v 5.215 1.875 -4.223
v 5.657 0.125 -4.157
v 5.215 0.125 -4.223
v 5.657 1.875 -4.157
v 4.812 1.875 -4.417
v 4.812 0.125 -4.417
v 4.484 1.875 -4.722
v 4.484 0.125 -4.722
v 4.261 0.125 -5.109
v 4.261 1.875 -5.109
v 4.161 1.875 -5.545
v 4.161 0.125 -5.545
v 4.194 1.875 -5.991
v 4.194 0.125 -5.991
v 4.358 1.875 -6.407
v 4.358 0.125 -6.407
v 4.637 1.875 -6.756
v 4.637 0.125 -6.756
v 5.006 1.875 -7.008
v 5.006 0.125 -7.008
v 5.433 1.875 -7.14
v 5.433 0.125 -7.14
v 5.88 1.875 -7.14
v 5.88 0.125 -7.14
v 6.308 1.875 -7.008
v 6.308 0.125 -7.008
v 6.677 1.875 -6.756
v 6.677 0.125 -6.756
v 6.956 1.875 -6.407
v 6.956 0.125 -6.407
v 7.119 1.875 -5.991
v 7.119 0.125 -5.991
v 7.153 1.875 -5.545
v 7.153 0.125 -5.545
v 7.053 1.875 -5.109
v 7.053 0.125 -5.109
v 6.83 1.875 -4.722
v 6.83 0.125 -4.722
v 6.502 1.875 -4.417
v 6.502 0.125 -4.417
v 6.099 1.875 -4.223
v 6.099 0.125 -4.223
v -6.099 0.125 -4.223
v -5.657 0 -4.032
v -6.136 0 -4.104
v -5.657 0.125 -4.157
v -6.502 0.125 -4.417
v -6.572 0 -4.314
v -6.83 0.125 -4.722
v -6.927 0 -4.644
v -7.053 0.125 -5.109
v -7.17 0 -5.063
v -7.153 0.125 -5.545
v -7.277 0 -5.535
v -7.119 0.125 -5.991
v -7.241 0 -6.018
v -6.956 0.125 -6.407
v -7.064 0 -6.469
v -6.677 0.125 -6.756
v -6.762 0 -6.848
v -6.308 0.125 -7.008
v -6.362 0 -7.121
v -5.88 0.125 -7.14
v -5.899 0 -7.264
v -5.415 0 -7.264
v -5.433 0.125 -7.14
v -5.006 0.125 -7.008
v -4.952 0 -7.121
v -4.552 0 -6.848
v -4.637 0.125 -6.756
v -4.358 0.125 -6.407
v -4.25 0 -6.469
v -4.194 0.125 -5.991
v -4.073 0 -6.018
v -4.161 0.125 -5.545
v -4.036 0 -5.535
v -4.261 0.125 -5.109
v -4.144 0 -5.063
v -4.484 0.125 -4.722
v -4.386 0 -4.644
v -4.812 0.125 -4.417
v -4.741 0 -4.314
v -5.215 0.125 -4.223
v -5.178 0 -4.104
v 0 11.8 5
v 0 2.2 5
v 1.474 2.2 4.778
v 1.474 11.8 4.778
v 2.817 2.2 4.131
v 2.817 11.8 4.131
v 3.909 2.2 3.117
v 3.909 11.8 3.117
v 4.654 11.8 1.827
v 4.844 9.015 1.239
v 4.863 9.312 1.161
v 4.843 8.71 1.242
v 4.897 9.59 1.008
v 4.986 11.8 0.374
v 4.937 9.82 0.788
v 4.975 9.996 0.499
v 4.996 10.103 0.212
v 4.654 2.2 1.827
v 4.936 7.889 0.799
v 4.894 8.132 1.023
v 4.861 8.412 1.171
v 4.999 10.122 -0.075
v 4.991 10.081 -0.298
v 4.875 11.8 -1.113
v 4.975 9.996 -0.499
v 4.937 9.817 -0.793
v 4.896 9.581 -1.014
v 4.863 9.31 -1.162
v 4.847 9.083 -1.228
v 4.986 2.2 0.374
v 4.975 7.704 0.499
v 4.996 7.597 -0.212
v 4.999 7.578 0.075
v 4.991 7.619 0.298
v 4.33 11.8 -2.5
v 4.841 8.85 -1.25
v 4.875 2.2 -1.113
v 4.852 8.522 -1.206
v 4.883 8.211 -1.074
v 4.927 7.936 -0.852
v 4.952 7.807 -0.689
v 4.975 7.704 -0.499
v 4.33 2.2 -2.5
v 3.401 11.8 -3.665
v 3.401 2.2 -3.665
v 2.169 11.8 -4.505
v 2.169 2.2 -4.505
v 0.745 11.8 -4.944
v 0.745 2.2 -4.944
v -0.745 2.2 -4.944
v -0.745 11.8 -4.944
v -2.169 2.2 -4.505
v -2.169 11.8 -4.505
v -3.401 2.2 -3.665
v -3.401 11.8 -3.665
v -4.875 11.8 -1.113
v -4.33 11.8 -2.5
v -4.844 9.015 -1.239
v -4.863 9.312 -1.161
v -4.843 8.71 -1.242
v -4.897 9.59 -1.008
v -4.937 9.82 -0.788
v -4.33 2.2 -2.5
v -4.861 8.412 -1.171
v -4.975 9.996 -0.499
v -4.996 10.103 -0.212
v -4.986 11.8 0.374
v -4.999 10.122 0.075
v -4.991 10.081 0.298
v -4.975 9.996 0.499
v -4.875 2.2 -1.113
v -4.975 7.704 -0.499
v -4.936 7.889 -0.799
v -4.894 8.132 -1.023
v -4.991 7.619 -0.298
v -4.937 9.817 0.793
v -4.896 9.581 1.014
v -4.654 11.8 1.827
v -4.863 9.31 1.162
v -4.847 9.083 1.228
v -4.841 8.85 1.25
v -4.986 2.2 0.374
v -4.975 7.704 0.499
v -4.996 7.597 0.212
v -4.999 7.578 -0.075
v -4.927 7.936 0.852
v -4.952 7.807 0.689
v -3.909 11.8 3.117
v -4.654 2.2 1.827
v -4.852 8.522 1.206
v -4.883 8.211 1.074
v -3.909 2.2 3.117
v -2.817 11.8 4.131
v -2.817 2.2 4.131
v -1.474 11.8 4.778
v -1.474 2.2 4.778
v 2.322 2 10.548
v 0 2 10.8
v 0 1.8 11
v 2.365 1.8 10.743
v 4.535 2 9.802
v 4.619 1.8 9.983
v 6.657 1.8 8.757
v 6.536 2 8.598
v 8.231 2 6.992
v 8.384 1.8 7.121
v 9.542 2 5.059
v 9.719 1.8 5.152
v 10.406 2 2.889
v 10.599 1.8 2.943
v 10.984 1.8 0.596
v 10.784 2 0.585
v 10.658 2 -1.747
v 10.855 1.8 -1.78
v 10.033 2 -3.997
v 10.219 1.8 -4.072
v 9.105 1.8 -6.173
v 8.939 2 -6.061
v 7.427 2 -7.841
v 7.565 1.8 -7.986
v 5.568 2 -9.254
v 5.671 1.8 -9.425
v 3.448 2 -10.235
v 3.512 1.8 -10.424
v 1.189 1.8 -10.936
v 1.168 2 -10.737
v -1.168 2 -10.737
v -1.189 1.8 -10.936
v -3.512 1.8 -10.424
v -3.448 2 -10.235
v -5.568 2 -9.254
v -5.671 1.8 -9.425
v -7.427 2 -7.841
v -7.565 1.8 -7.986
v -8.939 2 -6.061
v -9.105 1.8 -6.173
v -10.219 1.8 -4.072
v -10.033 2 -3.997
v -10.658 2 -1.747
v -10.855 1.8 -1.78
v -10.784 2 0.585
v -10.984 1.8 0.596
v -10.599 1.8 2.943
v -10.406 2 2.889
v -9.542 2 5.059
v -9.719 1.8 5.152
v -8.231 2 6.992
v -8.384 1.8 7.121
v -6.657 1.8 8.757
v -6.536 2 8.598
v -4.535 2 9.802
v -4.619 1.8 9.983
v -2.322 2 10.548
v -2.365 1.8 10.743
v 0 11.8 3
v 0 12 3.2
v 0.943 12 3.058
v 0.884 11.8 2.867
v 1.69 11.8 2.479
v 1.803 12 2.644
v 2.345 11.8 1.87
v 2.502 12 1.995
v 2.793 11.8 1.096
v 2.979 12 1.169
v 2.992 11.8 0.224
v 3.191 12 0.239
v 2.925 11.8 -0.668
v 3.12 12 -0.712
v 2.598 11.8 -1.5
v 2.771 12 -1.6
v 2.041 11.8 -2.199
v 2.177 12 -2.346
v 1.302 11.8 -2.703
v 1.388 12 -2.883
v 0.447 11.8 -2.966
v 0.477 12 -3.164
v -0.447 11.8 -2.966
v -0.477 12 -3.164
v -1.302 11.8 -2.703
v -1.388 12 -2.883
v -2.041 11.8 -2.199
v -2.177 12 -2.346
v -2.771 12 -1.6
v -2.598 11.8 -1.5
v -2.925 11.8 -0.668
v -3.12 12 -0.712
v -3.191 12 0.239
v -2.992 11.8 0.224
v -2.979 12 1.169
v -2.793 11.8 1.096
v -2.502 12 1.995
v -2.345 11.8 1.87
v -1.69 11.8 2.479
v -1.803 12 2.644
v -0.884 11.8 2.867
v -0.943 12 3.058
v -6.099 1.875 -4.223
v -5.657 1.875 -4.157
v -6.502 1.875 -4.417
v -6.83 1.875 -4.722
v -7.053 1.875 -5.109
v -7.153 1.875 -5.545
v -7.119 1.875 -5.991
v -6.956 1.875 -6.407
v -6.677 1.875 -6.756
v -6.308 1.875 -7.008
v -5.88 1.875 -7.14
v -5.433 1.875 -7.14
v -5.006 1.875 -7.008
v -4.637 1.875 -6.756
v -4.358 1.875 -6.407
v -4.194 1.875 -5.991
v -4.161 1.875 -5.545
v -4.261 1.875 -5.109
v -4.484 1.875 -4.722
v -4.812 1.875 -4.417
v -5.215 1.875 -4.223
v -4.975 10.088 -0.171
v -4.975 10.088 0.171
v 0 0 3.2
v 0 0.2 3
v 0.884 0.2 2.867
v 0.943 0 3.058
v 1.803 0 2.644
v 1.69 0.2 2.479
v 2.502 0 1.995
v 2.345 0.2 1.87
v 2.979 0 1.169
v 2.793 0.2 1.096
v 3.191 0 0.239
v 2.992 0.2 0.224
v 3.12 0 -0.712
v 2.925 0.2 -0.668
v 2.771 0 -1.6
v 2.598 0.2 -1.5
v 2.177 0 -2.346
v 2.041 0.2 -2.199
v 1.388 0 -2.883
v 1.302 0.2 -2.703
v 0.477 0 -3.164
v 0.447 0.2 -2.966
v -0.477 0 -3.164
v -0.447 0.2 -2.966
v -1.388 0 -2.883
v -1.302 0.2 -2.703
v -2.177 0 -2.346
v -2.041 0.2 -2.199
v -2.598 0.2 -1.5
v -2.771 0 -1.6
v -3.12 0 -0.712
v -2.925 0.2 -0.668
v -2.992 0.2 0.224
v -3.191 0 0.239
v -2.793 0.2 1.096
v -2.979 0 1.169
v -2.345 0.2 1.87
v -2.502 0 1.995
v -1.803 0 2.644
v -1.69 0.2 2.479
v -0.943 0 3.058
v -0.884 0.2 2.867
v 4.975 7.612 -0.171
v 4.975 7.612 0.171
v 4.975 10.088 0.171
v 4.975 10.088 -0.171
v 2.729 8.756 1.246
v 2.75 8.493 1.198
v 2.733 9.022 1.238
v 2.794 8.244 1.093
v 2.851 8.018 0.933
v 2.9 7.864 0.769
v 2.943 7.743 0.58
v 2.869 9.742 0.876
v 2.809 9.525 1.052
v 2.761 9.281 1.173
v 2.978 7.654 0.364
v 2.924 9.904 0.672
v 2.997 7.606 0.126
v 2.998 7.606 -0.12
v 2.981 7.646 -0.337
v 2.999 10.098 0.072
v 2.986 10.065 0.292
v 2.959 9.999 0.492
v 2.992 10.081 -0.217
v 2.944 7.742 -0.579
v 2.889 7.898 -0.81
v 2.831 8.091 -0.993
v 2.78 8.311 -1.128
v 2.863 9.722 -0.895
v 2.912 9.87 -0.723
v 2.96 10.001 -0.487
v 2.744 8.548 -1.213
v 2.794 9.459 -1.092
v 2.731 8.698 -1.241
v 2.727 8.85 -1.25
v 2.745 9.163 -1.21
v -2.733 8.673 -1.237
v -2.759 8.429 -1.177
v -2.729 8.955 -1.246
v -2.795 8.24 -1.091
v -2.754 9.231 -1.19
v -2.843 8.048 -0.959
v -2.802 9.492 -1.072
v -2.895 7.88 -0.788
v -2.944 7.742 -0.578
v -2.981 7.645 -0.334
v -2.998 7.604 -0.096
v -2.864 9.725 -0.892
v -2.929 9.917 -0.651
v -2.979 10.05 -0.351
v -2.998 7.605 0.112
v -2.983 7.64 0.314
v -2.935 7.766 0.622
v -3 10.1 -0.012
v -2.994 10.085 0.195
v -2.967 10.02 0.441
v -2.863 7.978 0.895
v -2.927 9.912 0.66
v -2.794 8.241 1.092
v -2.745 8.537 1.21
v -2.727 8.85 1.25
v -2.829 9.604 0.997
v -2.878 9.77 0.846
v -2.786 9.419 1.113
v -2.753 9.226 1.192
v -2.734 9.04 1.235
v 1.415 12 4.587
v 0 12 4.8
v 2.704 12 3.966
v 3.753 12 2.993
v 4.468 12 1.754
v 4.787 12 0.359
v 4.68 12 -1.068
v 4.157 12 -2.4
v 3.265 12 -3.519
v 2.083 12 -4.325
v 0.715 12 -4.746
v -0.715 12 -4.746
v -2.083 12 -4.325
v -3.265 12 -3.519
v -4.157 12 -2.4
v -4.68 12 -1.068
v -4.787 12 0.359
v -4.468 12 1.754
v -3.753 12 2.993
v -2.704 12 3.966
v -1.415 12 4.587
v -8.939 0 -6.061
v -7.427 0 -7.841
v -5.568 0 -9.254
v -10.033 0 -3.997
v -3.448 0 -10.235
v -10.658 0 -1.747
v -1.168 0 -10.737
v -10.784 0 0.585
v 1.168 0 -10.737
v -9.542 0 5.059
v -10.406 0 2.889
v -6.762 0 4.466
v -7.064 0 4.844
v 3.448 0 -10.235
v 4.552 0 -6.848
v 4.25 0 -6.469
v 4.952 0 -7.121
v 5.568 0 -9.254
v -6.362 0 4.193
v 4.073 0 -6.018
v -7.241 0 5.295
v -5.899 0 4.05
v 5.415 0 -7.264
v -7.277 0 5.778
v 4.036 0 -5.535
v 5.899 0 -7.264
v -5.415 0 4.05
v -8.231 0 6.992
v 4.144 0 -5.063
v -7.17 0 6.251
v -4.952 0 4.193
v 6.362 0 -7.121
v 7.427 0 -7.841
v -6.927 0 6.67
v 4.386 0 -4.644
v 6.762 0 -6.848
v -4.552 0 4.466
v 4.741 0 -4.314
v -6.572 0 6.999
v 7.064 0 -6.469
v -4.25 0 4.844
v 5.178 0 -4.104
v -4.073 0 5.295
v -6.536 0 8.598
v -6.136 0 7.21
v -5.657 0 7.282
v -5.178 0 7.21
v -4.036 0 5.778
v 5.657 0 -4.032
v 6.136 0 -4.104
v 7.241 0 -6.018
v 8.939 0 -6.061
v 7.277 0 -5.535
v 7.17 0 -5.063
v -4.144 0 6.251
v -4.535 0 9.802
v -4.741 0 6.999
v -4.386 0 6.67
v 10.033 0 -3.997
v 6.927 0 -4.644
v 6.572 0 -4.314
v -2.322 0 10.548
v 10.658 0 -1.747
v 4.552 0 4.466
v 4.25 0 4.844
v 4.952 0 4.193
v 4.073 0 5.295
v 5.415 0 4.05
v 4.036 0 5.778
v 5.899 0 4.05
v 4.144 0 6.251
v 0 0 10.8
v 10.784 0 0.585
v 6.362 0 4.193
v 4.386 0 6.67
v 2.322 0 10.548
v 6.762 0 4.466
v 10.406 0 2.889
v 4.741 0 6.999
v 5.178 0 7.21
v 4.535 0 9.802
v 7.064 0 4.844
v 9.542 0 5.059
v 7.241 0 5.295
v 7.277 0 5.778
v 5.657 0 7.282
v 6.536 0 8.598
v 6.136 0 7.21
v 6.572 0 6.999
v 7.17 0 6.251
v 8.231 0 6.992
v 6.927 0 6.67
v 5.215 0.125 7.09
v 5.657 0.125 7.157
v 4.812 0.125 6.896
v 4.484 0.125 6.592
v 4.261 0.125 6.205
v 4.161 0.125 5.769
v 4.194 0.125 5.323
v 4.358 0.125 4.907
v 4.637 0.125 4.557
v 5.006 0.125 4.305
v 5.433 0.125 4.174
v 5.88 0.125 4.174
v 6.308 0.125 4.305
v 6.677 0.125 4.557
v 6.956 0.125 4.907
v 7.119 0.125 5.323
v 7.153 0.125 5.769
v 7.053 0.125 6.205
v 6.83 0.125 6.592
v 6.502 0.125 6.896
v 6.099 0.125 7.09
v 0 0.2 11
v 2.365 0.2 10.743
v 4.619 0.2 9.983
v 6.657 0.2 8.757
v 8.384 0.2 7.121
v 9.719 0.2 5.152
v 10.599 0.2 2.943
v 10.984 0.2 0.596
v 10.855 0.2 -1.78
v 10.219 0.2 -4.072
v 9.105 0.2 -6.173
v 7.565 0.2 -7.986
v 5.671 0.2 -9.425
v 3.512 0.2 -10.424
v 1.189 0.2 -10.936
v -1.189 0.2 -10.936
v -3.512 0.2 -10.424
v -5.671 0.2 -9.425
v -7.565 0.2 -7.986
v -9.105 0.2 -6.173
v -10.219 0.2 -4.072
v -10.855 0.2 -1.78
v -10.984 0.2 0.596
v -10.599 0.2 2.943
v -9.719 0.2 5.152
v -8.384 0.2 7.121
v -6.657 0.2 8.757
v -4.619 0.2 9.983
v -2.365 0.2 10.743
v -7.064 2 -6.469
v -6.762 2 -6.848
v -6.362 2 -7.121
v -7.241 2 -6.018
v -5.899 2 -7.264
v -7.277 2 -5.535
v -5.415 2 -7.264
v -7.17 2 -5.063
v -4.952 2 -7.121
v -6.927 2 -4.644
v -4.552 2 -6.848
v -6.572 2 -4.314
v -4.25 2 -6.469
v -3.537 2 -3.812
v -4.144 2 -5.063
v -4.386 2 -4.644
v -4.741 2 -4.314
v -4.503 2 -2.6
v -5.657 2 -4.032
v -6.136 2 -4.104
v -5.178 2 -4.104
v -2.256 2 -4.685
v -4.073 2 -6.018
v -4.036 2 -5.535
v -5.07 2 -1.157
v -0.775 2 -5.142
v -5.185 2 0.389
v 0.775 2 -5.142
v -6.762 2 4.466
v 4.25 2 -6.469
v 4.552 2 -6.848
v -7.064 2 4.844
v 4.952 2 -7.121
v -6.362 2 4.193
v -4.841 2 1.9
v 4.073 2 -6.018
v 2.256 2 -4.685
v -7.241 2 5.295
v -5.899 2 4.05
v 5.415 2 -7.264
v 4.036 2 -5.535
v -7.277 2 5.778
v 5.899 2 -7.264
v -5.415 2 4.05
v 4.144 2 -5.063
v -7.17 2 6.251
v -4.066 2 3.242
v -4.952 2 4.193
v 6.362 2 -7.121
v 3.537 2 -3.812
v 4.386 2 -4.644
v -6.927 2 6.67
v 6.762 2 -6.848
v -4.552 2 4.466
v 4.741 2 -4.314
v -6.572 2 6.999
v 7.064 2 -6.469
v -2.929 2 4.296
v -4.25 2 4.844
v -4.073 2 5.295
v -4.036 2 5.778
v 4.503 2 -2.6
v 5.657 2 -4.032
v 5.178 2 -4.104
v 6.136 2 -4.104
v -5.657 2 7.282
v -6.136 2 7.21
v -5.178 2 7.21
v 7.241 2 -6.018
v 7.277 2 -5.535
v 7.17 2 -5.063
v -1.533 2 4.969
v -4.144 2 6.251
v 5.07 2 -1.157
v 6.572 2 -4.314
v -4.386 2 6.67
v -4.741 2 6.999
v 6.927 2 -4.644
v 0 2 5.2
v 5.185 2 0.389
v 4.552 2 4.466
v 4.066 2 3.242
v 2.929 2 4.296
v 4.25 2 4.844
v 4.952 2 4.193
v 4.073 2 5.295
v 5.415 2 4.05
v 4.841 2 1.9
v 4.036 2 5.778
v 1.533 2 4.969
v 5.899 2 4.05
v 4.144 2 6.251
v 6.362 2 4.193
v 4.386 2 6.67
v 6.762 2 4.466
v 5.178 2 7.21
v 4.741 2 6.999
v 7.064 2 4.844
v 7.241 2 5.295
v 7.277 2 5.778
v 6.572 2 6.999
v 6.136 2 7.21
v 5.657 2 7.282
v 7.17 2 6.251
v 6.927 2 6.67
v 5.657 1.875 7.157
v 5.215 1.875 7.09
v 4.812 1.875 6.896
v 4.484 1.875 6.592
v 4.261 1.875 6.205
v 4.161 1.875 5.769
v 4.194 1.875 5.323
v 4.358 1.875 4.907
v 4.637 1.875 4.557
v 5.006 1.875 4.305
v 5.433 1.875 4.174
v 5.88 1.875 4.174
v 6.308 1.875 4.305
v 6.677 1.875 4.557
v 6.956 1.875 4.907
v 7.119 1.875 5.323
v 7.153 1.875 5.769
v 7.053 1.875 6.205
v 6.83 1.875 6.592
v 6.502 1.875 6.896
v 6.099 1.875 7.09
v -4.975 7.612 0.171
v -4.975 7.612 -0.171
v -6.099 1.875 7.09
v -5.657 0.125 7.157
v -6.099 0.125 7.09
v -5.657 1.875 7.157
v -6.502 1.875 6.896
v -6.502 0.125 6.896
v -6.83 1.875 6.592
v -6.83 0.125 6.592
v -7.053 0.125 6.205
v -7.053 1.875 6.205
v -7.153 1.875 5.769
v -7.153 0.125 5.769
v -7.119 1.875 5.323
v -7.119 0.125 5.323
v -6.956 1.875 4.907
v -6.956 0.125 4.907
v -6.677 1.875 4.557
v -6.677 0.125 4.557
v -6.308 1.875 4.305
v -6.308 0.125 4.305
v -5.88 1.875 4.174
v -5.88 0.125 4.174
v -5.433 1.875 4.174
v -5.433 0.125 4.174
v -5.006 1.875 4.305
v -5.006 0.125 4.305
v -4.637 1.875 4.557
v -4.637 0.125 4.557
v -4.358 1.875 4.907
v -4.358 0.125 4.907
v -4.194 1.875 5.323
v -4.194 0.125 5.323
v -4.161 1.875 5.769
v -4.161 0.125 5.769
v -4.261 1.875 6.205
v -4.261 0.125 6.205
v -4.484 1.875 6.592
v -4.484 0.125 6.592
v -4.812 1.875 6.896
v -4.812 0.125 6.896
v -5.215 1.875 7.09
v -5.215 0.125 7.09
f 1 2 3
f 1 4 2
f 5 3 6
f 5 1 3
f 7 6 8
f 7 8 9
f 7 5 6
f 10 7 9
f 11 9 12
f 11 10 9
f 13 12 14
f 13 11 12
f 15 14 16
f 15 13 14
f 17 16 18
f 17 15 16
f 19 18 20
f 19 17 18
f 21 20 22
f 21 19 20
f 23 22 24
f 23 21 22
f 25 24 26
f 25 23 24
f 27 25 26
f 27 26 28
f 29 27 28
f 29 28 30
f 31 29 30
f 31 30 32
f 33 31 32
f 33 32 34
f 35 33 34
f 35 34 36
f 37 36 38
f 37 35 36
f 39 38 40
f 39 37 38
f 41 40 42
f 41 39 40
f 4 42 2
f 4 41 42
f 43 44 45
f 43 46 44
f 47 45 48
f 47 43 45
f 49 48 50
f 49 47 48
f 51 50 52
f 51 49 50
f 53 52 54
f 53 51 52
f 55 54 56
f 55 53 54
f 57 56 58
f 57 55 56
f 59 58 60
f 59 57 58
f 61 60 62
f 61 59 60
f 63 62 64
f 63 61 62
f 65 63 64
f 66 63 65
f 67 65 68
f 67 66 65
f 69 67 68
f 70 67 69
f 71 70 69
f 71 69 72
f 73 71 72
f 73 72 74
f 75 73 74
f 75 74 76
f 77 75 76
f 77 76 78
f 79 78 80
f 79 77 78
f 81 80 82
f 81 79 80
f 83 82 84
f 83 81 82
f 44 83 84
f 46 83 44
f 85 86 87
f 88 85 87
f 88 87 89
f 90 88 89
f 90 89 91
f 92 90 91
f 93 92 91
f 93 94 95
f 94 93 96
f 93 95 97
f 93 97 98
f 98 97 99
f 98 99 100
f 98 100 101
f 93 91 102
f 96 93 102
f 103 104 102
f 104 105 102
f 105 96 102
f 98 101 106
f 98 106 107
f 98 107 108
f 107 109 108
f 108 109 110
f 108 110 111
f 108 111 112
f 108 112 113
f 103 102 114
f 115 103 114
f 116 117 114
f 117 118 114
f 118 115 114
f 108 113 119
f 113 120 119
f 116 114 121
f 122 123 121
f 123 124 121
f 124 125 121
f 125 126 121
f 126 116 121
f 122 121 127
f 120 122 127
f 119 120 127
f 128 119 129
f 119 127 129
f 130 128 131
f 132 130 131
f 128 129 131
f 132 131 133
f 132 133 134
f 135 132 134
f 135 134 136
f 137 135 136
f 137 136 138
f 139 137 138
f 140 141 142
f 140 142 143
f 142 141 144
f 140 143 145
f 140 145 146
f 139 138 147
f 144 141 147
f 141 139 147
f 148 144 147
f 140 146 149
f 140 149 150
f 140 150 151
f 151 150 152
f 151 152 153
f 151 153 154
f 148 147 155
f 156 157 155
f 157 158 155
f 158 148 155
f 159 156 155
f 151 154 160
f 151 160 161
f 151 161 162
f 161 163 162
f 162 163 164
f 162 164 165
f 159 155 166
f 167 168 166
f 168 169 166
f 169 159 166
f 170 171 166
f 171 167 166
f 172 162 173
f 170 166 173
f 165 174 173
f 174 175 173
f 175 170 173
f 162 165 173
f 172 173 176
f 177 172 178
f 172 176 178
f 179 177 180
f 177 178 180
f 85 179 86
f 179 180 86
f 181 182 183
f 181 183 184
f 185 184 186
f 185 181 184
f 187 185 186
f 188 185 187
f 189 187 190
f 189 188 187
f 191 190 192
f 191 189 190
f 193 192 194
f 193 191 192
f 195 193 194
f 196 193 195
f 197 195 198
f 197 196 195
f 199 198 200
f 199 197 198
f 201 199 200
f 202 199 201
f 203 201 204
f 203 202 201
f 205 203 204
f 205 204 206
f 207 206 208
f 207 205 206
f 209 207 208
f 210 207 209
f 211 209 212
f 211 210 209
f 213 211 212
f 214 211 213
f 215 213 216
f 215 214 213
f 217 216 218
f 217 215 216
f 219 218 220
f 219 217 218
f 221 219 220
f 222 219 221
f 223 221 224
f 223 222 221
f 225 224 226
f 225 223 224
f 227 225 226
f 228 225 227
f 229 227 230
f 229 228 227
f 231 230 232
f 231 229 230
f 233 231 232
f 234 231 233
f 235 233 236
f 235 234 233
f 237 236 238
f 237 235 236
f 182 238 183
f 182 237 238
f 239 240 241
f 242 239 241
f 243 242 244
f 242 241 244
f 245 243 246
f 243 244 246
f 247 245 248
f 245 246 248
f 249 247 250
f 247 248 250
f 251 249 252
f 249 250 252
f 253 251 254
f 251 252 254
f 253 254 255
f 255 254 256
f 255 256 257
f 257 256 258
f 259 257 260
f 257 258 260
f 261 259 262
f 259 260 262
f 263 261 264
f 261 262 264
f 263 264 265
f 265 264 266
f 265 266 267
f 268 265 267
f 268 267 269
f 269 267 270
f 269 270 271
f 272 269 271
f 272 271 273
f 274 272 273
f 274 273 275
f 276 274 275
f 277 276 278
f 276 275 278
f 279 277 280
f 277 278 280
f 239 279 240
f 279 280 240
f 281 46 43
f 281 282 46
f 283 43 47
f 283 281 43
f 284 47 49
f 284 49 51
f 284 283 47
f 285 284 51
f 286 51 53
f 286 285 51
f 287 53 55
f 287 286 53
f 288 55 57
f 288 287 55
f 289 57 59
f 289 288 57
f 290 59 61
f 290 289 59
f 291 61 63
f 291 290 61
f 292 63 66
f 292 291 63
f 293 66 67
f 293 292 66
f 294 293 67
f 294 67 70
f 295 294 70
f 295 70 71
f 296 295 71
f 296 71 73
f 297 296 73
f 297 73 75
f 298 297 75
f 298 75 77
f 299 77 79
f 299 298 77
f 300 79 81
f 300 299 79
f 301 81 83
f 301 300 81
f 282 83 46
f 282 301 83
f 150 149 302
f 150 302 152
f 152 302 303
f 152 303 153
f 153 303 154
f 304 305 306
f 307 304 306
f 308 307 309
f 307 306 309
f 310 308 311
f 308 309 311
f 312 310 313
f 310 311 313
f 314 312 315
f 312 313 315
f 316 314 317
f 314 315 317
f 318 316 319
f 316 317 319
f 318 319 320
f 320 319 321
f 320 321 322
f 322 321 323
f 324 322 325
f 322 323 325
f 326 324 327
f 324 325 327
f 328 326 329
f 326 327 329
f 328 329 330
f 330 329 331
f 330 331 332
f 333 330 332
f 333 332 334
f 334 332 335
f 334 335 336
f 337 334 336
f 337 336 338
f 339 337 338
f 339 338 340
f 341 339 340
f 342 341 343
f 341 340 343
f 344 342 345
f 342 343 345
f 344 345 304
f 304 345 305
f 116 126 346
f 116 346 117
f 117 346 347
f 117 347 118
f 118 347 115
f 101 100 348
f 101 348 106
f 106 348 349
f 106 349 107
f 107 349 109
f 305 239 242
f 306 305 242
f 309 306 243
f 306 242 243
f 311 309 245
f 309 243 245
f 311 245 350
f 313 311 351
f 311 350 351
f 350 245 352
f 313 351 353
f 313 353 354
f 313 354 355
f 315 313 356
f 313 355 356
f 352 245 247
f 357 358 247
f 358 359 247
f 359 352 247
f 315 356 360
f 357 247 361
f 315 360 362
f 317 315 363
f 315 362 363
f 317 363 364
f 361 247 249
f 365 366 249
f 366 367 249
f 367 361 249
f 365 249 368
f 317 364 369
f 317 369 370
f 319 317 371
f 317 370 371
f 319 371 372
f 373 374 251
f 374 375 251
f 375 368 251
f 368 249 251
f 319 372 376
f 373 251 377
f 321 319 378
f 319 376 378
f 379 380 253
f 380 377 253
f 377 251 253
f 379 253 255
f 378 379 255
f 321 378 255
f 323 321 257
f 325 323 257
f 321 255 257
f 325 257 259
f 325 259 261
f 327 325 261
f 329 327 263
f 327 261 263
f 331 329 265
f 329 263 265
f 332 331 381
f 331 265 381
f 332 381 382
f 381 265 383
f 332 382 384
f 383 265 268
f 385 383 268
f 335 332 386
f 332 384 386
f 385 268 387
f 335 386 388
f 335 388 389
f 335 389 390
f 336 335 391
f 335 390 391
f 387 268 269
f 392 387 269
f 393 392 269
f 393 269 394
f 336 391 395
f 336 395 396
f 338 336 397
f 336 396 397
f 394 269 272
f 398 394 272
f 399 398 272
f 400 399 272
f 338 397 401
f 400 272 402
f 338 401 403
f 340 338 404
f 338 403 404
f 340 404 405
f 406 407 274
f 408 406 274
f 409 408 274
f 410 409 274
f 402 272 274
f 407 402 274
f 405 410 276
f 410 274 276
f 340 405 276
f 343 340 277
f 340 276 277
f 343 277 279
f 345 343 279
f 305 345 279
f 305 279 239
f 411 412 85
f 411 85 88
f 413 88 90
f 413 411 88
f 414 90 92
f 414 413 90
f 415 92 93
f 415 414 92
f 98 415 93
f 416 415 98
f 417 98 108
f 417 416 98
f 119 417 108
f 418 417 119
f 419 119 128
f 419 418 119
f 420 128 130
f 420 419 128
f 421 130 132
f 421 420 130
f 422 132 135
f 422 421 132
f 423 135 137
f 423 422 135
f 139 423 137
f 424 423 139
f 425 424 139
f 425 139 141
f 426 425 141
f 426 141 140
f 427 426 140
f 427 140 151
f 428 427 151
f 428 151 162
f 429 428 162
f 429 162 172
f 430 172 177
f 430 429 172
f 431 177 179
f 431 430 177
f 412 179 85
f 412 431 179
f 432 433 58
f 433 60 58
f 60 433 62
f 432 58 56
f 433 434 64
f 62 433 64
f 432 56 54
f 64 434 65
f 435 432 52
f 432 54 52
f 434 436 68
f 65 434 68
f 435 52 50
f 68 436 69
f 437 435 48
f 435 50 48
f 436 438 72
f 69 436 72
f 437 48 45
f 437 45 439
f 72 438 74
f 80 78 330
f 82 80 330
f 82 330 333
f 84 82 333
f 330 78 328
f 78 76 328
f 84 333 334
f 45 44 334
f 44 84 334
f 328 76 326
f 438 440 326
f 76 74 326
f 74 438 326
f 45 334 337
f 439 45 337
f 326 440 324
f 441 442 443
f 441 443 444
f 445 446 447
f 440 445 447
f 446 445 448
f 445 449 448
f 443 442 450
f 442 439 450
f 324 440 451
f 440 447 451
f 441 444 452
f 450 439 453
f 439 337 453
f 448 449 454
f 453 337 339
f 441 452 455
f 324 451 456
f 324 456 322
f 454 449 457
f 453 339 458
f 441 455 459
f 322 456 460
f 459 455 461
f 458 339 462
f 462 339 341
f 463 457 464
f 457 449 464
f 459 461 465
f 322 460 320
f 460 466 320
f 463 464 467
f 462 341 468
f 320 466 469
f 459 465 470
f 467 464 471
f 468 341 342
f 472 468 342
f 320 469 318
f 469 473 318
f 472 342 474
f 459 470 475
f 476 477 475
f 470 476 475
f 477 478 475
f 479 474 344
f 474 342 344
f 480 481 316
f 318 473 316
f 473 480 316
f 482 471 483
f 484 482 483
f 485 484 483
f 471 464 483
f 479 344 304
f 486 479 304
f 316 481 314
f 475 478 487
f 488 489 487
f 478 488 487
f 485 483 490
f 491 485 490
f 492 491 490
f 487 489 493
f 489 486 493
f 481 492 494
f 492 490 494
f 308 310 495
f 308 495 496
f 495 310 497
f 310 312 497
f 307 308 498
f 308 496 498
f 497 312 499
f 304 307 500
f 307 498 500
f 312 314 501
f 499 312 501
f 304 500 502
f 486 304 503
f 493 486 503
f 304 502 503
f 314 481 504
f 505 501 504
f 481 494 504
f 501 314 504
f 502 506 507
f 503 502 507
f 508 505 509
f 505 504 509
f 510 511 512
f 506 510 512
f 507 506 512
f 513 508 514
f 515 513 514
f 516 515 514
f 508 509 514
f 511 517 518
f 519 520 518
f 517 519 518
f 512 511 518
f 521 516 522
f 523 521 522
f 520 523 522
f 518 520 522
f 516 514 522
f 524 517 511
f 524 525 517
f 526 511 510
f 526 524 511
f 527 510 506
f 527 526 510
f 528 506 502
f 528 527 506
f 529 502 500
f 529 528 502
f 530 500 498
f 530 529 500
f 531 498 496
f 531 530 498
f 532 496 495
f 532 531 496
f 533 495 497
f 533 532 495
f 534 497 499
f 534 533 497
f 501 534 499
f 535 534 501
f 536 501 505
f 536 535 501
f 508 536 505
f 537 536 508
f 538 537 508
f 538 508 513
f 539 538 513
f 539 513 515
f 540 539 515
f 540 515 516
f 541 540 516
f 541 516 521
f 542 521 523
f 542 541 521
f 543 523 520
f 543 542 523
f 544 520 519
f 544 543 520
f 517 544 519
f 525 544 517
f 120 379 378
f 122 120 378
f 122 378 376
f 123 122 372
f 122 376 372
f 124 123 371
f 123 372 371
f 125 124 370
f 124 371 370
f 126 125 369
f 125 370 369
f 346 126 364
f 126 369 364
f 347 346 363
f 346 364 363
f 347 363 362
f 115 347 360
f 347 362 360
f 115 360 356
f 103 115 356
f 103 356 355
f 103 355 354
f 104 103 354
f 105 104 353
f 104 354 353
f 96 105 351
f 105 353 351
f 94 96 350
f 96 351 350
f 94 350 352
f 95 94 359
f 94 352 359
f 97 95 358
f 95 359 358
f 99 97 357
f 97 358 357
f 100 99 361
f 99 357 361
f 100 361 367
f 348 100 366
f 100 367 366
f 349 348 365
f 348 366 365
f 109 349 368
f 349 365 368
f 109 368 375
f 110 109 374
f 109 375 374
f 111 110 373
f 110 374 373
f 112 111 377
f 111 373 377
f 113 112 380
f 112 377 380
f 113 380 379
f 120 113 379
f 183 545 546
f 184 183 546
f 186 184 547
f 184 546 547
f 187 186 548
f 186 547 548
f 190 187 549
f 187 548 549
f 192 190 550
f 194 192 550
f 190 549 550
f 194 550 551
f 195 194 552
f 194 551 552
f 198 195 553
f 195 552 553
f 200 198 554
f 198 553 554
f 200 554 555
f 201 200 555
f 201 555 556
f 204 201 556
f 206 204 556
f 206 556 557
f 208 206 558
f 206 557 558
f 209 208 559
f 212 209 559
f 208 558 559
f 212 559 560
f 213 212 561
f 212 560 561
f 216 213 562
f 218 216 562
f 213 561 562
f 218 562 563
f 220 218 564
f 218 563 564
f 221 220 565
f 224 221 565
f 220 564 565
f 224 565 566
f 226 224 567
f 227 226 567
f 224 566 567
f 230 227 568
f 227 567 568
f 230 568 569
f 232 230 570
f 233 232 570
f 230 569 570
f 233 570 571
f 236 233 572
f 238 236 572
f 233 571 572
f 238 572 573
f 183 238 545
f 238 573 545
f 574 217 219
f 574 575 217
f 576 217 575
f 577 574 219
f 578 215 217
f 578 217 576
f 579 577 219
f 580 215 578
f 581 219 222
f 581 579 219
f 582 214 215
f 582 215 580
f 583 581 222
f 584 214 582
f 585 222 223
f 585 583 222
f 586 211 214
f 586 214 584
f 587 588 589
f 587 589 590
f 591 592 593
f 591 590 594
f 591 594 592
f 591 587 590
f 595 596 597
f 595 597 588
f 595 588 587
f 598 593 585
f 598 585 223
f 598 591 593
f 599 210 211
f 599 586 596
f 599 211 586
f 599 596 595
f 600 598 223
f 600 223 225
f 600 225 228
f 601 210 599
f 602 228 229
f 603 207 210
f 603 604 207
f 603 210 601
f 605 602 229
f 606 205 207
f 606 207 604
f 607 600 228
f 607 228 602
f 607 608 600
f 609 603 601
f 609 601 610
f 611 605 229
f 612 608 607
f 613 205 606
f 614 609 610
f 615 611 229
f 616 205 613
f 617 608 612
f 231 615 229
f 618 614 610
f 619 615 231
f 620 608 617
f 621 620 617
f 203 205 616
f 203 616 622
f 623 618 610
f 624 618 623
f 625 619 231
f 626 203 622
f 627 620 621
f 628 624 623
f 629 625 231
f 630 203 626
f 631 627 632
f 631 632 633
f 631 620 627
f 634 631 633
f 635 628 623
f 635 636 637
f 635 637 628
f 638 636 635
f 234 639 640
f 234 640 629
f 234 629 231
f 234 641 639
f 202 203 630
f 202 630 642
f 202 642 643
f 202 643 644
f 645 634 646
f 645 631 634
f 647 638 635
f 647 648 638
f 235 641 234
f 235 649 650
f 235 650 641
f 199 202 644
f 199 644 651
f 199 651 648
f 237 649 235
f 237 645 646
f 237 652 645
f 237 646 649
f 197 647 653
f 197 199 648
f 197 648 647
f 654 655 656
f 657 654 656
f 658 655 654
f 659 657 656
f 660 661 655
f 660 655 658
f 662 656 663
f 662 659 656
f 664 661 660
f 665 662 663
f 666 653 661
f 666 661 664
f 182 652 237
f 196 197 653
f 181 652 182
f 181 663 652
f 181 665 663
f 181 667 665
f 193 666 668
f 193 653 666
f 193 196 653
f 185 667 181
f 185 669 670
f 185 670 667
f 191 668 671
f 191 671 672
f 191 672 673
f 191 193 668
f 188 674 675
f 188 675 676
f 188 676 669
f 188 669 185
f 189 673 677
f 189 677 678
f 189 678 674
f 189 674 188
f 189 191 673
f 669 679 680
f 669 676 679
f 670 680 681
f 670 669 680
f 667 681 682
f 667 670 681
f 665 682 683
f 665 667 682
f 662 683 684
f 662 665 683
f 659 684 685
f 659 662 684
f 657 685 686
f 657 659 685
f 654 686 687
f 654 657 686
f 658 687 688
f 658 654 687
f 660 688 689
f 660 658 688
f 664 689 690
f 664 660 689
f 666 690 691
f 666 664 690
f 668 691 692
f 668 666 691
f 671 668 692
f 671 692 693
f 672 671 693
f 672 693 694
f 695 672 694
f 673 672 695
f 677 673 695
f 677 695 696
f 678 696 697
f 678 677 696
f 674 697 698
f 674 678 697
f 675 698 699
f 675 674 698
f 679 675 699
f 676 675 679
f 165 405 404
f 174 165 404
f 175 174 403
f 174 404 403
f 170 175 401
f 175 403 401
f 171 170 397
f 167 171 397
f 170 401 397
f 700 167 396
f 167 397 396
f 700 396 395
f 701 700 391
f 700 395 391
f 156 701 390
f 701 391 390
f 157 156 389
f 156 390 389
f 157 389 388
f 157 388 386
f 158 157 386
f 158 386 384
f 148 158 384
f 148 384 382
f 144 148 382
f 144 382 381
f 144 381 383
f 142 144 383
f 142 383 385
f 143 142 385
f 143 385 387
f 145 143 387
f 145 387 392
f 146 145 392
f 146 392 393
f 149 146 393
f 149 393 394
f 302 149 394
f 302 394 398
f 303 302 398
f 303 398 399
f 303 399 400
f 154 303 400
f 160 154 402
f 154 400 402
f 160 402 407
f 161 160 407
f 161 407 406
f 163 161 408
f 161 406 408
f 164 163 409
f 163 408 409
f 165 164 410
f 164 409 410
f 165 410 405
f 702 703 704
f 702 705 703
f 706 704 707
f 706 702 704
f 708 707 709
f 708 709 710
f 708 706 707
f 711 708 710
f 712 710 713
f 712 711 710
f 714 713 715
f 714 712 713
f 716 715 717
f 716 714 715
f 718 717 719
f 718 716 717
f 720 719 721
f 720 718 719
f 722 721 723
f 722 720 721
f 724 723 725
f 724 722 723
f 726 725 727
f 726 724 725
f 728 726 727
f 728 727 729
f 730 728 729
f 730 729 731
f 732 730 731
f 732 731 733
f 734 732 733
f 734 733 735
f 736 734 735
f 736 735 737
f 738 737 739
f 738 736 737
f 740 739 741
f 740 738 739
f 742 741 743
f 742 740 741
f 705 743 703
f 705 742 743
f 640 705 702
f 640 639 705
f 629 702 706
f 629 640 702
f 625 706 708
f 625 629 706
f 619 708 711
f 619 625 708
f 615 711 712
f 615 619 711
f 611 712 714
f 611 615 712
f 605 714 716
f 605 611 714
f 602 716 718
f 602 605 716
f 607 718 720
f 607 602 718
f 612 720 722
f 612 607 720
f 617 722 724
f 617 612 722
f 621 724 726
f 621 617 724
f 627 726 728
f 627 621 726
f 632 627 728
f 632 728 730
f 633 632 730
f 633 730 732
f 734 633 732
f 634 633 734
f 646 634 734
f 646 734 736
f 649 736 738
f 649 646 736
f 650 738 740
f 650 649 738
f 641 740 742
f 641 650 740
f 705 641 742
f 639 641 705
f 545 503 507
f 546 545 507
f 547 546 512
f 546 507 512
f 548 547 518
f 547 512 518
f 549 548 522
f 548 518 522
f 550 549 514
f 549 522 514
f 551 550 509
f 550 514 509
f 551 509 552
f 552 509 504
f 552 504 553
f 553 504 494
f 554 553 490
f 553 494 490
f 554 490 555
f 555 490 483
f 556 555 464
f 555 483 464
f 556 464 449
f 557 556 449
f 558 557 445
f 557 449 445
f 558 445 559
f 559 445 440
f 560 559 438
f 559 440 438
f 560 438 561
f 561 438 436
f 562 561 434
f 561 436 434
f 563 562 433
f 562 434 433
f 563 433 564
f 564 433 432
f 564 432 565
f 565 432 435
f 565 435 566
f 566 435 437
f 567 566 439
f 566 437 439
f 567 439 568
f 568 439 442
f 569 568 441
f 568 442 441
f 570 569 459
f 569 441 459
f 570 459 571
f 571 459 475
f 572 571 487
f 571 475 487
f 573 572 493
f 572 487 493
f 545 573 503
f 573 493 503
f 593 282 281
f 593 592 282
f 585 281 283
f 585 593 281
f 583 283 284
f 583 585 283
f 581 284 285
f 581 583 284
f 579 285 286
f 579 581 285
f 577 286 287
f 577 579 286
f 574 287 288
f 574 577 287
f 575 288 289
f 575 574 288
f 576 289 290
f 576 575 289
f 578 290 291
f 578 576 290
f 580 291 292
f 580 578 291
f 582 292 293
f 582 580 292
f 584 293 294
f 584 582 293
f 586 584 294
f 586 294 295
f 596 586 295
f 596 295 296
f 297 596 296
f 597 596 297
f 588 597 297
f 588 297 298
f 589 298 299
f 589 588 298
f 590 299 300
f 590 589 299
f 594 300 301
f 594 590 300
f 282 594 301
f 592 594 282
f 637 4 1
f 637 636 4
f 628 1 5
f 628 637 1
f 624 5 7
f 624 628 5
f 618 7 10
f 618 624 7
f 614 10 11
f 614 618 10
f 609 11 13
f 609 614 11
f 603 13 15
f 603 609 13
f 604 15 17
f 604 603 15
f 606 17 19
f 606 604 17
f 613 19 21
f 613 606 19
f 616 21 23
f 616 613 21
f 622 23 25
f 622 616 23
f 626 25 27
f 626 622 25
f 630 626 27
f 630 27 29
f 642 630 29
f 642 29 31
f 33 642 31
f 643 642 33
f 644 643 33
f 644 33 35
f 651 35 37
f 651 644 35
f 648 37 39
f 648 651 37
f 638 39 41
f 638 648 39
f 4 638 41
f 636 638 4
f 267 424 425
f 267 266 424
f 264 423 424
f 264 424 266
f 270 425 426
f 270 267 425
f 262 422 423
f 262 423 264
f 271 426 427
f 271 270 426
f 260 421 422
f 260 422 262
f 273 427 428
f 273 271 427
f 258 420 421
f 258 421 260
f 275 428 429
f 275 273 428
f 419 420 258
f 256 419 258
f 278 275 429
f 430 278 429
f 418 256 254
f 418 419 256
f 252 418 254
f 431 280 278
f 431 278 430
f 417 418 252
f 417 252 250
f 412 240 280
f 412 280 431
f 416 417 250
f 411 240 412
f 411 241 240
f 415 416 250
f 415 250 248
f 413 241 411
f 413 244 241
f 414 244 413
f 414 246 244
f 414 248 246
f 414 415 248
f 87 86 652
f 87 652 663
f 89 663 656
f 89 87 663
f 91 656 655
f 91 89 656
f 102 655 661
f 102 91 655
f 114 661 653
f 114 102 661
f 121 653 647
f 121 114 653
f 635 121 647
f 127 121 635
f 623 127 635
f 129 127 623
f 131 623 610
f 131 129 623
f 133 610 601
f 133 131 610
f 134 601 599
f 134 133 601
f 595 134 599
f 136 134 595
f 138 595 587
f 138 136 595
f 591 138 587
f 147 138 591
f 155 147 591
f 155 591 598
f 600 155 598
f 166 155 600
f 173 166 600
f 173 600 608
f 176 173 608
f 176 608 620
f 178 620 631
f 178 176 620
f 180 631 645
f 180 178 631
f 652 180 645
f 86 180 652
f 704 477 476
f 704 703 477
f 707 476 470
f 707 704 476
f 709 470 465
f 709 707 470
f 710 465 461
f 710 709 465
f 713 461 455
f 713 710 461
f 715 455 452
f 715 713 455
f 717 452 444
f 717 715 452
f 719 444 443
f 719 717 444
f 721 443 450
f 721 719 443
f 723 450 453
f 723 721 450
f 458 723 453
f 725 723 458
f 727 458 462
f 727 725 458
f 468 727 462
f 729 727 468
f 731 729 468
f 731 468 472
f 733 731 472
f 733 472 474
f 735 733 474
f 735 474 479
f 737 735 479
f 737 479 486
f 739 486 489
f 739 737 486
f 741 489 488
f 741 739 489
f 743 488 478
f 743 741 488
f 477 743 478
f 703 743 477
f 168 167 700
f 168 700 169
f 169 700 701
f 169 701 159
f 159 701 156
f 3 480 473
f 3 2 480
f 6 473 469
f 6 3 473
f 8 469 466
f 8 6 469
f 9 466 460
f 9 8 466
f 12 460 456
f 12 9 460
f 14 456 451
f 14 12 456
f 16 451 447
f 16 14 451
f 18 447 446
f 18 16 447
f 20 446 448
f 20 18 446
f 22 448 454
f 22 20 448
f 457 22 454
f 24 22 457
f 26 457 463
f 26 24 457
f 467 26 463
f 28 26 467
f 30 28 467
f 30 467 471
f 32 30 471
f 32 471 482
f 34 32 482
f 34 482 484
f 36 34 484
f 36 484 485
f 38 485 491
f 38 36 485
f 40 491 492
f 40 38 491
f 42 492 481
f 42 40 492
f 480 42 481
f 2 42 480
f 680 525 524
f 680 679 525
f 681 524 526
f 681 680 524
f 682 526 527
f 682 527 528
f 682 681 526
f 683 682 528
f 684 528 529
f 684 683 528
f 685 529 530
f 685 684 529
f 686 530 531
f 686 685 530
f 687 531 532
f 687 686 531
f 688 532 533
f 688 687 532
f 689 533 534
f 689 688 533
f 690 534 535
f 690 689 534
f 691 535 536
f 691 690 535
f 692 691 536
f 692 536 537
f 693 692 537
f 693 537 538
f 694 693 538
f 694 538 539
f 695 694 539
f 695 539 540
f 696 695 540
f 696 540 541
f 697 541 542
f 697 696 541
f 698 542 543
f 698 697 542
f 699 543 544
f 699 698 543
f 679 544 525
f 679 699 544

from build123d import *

# Parameters (mm, degrees)
SKETCH1_R                   = 11
FLANGE_DEPTH                = 2
SKETCH2_R                   = 5
COLLAR_DEPTH                = 10
SKETCH3_R                   = 3
CUT_EXTRUDE1_DEPTH          = 20.646882704
SET_SCREW_TAP_1_D           = 2.5
SET_SCREW_TAP_1_DEPTH       = 5
SET_SCREW_TAP_1_CSINK_D     = 2.55
SET_SCREW_TAP_1_CSINK_ANGLE = 90
SET_SCREW_TAP_2_D           = 2.5
SET_SCREW_TAP_2_DEPTH       = 8.001
SET_SCREW_TAP_2_CSINK_D     = 2.55
SET_SCREW_TAP_2_CSINK_ANGLE = 90
FLANGE_HOLES_AT_2_COUNT     = 2
FLANGE_HOLES_AT_2_PITCH     = 8
FLANGE_HOLES_AT_3_COUNT     = 2
FLANGE_HOLES_AT_3_PITCH     = 8
FLANGE_HOLES_AT_4_COUNT     = 2
FLANGE_HOLES_AT_4_PITCH     = 8
FLANGE_HOLES_AT_5_COUNT     = 2
FLANGE_HOLES_AT_5_PITCH     = 8
BODY_CHAMFERS_SIZE          = 0.2


with BuildPart() as part:
    # Sketch1 → Flange (new body)
    with BuildSketch(Plane(origin=(0, 0, 0), x_dir=(1, 0, 0), z_dir=(0, 1, 0))):
        with Locations(Location((0, 0, 0), (0, 0, 270))):
            Circle(SKETCH1_R)
    extrude(amount=FLANGE_DEPTH)

    # Sketch2 → Collar (add)
    with BuildSketch(Plane(origin=(0, 2, 0), x_dir=(1, 0, 0), z_dir=(0, 1, 0))):
        with Locations(Location((0, 0, 0), (0, 0, 270))):
            Circle(SKETCH2_R)
    extrude(amount=COLLAR_DEPTH)

    # Sketch3 → Cut-Extrude1 (cut, through all)
    with BuildSketch(Plane(origin=(0, 12, 0), x_dir=(1, 0, 0), z_dir=(0, 1, 0))):
        with Locations(Location((0, 0, 0), (0, 0, 270))):
            Circle(SKETCH3_R)
    extrude(amount=-CUT_EXTRUDE1_DEPTH, mode=Mode.SUBTRACT)

    # Set Screw Tap 1
    with Locations(Plane(origin=(5, 8.85, 0), x_dir=(0, 0, 1), z_dir=(1, 0, 0))):
        with Locations((0, 0)):
            CounterSinkHole(SET_SCREW_TAP_1_D / 2, SET_SCREW_TAP_1_CSINK_D / 2, depth=SET_SCREW_TAP_1_DEPTH, counter_sink_angle=SET_SCREW_TAP_1_CSINK_ANGLE)

    # Set Screw Tap 2
    with Locations(Plane(origin=(-5, 8.85, 0), x_dir=(0, 0, -1), z_dir=(-1, 0, 0))):
        with Locations((0, 0)):
            CounterSinkHole(SET_SCREW_TAP_2_D / 2, SET_SCREW_TAP_2_CSINK_D / 2, depth=SET_SCREW_TAP_2_DEPTH, counter_sink_angle=SET_SCREW_TAP_2_CSINK_ANGLE)

    # Sketch11 → Flange Holes (revolve, cut)
    with BuildSketch(Plane(origin=(0, 2, 0), x_dir=(0, 0, 1), z_dir=(1, 0, 0))):
        Polygon((0, 0), (0, 2), (1.625, 2), (1.5, 1.875), (1.5, 0.125), (1.625, 0), align=None)
    flange_holes = revolve(axis=Axis((0, 8.35, 0), (0, -1, 0)), mode=Mode.SUBTRACT)

    # Flange Holes at 2: Flange Holes ×2
    with Locations(*[Vector(-0.7071067811865476, 0, -0.7071067811865476) * (i * FLANGE_HOLES_AT_2_PITCH) for i in range(1, FLANGE_HOLES_AT_2_COUNT)]):
        add(flange_holes, mode=Mode.SUBTRACT)

    # Flange Holes at 3: Flange Holes ×2
    with Locations(*[Vector(-0.7071067811865476, 0, 0.7071067811865476) * (i * FLANGE_HOLES_AT_3_PITCH) for i in range(1, FLANGE_HOLES_AT_3_COUNT)]):
        add(flange_holes, mode=Mode.SUBTRACT)

    # Flange Holes at 4: Flange Holes ×2
    with Locations(*[Vector(0.7071067811865476, 0, 0.7071067811865476) * (i * FLANGE_HOLES_AT_4_PITCH) for i in range(1, FLANGE_HOLES_AT_4_COUNT)]):
        add(flange_holes, mode=Mode.SUBTRACT)

    # Flange Holes at 5: Flange Holes ×2
    with Locations(*[Vector(0.7071067811865476, 0, -0.7071067811865476) * (i * FLANGE_HOLES_AT_5_PITCH) for i in range(1, FLANGE_HOLES_AT_5_COUNT)]):
        add(flange_holes, mode=Mode.SUBTRACT)

    # Body Chamfers
    body_chamfers_edges = [part.edges().sort_by_distance(p)[0] for p in [
        (0, 0, -3),
        (0, 12, -3),
        (0, 0, -11),
        (0, 2, -11),
        (0, 2, -5),
        (0, 12, -5),
    ]]
    chamfer(body_chamfers_edges, length=BODY_CHAMFERS_SIZE)


solid = part.part
